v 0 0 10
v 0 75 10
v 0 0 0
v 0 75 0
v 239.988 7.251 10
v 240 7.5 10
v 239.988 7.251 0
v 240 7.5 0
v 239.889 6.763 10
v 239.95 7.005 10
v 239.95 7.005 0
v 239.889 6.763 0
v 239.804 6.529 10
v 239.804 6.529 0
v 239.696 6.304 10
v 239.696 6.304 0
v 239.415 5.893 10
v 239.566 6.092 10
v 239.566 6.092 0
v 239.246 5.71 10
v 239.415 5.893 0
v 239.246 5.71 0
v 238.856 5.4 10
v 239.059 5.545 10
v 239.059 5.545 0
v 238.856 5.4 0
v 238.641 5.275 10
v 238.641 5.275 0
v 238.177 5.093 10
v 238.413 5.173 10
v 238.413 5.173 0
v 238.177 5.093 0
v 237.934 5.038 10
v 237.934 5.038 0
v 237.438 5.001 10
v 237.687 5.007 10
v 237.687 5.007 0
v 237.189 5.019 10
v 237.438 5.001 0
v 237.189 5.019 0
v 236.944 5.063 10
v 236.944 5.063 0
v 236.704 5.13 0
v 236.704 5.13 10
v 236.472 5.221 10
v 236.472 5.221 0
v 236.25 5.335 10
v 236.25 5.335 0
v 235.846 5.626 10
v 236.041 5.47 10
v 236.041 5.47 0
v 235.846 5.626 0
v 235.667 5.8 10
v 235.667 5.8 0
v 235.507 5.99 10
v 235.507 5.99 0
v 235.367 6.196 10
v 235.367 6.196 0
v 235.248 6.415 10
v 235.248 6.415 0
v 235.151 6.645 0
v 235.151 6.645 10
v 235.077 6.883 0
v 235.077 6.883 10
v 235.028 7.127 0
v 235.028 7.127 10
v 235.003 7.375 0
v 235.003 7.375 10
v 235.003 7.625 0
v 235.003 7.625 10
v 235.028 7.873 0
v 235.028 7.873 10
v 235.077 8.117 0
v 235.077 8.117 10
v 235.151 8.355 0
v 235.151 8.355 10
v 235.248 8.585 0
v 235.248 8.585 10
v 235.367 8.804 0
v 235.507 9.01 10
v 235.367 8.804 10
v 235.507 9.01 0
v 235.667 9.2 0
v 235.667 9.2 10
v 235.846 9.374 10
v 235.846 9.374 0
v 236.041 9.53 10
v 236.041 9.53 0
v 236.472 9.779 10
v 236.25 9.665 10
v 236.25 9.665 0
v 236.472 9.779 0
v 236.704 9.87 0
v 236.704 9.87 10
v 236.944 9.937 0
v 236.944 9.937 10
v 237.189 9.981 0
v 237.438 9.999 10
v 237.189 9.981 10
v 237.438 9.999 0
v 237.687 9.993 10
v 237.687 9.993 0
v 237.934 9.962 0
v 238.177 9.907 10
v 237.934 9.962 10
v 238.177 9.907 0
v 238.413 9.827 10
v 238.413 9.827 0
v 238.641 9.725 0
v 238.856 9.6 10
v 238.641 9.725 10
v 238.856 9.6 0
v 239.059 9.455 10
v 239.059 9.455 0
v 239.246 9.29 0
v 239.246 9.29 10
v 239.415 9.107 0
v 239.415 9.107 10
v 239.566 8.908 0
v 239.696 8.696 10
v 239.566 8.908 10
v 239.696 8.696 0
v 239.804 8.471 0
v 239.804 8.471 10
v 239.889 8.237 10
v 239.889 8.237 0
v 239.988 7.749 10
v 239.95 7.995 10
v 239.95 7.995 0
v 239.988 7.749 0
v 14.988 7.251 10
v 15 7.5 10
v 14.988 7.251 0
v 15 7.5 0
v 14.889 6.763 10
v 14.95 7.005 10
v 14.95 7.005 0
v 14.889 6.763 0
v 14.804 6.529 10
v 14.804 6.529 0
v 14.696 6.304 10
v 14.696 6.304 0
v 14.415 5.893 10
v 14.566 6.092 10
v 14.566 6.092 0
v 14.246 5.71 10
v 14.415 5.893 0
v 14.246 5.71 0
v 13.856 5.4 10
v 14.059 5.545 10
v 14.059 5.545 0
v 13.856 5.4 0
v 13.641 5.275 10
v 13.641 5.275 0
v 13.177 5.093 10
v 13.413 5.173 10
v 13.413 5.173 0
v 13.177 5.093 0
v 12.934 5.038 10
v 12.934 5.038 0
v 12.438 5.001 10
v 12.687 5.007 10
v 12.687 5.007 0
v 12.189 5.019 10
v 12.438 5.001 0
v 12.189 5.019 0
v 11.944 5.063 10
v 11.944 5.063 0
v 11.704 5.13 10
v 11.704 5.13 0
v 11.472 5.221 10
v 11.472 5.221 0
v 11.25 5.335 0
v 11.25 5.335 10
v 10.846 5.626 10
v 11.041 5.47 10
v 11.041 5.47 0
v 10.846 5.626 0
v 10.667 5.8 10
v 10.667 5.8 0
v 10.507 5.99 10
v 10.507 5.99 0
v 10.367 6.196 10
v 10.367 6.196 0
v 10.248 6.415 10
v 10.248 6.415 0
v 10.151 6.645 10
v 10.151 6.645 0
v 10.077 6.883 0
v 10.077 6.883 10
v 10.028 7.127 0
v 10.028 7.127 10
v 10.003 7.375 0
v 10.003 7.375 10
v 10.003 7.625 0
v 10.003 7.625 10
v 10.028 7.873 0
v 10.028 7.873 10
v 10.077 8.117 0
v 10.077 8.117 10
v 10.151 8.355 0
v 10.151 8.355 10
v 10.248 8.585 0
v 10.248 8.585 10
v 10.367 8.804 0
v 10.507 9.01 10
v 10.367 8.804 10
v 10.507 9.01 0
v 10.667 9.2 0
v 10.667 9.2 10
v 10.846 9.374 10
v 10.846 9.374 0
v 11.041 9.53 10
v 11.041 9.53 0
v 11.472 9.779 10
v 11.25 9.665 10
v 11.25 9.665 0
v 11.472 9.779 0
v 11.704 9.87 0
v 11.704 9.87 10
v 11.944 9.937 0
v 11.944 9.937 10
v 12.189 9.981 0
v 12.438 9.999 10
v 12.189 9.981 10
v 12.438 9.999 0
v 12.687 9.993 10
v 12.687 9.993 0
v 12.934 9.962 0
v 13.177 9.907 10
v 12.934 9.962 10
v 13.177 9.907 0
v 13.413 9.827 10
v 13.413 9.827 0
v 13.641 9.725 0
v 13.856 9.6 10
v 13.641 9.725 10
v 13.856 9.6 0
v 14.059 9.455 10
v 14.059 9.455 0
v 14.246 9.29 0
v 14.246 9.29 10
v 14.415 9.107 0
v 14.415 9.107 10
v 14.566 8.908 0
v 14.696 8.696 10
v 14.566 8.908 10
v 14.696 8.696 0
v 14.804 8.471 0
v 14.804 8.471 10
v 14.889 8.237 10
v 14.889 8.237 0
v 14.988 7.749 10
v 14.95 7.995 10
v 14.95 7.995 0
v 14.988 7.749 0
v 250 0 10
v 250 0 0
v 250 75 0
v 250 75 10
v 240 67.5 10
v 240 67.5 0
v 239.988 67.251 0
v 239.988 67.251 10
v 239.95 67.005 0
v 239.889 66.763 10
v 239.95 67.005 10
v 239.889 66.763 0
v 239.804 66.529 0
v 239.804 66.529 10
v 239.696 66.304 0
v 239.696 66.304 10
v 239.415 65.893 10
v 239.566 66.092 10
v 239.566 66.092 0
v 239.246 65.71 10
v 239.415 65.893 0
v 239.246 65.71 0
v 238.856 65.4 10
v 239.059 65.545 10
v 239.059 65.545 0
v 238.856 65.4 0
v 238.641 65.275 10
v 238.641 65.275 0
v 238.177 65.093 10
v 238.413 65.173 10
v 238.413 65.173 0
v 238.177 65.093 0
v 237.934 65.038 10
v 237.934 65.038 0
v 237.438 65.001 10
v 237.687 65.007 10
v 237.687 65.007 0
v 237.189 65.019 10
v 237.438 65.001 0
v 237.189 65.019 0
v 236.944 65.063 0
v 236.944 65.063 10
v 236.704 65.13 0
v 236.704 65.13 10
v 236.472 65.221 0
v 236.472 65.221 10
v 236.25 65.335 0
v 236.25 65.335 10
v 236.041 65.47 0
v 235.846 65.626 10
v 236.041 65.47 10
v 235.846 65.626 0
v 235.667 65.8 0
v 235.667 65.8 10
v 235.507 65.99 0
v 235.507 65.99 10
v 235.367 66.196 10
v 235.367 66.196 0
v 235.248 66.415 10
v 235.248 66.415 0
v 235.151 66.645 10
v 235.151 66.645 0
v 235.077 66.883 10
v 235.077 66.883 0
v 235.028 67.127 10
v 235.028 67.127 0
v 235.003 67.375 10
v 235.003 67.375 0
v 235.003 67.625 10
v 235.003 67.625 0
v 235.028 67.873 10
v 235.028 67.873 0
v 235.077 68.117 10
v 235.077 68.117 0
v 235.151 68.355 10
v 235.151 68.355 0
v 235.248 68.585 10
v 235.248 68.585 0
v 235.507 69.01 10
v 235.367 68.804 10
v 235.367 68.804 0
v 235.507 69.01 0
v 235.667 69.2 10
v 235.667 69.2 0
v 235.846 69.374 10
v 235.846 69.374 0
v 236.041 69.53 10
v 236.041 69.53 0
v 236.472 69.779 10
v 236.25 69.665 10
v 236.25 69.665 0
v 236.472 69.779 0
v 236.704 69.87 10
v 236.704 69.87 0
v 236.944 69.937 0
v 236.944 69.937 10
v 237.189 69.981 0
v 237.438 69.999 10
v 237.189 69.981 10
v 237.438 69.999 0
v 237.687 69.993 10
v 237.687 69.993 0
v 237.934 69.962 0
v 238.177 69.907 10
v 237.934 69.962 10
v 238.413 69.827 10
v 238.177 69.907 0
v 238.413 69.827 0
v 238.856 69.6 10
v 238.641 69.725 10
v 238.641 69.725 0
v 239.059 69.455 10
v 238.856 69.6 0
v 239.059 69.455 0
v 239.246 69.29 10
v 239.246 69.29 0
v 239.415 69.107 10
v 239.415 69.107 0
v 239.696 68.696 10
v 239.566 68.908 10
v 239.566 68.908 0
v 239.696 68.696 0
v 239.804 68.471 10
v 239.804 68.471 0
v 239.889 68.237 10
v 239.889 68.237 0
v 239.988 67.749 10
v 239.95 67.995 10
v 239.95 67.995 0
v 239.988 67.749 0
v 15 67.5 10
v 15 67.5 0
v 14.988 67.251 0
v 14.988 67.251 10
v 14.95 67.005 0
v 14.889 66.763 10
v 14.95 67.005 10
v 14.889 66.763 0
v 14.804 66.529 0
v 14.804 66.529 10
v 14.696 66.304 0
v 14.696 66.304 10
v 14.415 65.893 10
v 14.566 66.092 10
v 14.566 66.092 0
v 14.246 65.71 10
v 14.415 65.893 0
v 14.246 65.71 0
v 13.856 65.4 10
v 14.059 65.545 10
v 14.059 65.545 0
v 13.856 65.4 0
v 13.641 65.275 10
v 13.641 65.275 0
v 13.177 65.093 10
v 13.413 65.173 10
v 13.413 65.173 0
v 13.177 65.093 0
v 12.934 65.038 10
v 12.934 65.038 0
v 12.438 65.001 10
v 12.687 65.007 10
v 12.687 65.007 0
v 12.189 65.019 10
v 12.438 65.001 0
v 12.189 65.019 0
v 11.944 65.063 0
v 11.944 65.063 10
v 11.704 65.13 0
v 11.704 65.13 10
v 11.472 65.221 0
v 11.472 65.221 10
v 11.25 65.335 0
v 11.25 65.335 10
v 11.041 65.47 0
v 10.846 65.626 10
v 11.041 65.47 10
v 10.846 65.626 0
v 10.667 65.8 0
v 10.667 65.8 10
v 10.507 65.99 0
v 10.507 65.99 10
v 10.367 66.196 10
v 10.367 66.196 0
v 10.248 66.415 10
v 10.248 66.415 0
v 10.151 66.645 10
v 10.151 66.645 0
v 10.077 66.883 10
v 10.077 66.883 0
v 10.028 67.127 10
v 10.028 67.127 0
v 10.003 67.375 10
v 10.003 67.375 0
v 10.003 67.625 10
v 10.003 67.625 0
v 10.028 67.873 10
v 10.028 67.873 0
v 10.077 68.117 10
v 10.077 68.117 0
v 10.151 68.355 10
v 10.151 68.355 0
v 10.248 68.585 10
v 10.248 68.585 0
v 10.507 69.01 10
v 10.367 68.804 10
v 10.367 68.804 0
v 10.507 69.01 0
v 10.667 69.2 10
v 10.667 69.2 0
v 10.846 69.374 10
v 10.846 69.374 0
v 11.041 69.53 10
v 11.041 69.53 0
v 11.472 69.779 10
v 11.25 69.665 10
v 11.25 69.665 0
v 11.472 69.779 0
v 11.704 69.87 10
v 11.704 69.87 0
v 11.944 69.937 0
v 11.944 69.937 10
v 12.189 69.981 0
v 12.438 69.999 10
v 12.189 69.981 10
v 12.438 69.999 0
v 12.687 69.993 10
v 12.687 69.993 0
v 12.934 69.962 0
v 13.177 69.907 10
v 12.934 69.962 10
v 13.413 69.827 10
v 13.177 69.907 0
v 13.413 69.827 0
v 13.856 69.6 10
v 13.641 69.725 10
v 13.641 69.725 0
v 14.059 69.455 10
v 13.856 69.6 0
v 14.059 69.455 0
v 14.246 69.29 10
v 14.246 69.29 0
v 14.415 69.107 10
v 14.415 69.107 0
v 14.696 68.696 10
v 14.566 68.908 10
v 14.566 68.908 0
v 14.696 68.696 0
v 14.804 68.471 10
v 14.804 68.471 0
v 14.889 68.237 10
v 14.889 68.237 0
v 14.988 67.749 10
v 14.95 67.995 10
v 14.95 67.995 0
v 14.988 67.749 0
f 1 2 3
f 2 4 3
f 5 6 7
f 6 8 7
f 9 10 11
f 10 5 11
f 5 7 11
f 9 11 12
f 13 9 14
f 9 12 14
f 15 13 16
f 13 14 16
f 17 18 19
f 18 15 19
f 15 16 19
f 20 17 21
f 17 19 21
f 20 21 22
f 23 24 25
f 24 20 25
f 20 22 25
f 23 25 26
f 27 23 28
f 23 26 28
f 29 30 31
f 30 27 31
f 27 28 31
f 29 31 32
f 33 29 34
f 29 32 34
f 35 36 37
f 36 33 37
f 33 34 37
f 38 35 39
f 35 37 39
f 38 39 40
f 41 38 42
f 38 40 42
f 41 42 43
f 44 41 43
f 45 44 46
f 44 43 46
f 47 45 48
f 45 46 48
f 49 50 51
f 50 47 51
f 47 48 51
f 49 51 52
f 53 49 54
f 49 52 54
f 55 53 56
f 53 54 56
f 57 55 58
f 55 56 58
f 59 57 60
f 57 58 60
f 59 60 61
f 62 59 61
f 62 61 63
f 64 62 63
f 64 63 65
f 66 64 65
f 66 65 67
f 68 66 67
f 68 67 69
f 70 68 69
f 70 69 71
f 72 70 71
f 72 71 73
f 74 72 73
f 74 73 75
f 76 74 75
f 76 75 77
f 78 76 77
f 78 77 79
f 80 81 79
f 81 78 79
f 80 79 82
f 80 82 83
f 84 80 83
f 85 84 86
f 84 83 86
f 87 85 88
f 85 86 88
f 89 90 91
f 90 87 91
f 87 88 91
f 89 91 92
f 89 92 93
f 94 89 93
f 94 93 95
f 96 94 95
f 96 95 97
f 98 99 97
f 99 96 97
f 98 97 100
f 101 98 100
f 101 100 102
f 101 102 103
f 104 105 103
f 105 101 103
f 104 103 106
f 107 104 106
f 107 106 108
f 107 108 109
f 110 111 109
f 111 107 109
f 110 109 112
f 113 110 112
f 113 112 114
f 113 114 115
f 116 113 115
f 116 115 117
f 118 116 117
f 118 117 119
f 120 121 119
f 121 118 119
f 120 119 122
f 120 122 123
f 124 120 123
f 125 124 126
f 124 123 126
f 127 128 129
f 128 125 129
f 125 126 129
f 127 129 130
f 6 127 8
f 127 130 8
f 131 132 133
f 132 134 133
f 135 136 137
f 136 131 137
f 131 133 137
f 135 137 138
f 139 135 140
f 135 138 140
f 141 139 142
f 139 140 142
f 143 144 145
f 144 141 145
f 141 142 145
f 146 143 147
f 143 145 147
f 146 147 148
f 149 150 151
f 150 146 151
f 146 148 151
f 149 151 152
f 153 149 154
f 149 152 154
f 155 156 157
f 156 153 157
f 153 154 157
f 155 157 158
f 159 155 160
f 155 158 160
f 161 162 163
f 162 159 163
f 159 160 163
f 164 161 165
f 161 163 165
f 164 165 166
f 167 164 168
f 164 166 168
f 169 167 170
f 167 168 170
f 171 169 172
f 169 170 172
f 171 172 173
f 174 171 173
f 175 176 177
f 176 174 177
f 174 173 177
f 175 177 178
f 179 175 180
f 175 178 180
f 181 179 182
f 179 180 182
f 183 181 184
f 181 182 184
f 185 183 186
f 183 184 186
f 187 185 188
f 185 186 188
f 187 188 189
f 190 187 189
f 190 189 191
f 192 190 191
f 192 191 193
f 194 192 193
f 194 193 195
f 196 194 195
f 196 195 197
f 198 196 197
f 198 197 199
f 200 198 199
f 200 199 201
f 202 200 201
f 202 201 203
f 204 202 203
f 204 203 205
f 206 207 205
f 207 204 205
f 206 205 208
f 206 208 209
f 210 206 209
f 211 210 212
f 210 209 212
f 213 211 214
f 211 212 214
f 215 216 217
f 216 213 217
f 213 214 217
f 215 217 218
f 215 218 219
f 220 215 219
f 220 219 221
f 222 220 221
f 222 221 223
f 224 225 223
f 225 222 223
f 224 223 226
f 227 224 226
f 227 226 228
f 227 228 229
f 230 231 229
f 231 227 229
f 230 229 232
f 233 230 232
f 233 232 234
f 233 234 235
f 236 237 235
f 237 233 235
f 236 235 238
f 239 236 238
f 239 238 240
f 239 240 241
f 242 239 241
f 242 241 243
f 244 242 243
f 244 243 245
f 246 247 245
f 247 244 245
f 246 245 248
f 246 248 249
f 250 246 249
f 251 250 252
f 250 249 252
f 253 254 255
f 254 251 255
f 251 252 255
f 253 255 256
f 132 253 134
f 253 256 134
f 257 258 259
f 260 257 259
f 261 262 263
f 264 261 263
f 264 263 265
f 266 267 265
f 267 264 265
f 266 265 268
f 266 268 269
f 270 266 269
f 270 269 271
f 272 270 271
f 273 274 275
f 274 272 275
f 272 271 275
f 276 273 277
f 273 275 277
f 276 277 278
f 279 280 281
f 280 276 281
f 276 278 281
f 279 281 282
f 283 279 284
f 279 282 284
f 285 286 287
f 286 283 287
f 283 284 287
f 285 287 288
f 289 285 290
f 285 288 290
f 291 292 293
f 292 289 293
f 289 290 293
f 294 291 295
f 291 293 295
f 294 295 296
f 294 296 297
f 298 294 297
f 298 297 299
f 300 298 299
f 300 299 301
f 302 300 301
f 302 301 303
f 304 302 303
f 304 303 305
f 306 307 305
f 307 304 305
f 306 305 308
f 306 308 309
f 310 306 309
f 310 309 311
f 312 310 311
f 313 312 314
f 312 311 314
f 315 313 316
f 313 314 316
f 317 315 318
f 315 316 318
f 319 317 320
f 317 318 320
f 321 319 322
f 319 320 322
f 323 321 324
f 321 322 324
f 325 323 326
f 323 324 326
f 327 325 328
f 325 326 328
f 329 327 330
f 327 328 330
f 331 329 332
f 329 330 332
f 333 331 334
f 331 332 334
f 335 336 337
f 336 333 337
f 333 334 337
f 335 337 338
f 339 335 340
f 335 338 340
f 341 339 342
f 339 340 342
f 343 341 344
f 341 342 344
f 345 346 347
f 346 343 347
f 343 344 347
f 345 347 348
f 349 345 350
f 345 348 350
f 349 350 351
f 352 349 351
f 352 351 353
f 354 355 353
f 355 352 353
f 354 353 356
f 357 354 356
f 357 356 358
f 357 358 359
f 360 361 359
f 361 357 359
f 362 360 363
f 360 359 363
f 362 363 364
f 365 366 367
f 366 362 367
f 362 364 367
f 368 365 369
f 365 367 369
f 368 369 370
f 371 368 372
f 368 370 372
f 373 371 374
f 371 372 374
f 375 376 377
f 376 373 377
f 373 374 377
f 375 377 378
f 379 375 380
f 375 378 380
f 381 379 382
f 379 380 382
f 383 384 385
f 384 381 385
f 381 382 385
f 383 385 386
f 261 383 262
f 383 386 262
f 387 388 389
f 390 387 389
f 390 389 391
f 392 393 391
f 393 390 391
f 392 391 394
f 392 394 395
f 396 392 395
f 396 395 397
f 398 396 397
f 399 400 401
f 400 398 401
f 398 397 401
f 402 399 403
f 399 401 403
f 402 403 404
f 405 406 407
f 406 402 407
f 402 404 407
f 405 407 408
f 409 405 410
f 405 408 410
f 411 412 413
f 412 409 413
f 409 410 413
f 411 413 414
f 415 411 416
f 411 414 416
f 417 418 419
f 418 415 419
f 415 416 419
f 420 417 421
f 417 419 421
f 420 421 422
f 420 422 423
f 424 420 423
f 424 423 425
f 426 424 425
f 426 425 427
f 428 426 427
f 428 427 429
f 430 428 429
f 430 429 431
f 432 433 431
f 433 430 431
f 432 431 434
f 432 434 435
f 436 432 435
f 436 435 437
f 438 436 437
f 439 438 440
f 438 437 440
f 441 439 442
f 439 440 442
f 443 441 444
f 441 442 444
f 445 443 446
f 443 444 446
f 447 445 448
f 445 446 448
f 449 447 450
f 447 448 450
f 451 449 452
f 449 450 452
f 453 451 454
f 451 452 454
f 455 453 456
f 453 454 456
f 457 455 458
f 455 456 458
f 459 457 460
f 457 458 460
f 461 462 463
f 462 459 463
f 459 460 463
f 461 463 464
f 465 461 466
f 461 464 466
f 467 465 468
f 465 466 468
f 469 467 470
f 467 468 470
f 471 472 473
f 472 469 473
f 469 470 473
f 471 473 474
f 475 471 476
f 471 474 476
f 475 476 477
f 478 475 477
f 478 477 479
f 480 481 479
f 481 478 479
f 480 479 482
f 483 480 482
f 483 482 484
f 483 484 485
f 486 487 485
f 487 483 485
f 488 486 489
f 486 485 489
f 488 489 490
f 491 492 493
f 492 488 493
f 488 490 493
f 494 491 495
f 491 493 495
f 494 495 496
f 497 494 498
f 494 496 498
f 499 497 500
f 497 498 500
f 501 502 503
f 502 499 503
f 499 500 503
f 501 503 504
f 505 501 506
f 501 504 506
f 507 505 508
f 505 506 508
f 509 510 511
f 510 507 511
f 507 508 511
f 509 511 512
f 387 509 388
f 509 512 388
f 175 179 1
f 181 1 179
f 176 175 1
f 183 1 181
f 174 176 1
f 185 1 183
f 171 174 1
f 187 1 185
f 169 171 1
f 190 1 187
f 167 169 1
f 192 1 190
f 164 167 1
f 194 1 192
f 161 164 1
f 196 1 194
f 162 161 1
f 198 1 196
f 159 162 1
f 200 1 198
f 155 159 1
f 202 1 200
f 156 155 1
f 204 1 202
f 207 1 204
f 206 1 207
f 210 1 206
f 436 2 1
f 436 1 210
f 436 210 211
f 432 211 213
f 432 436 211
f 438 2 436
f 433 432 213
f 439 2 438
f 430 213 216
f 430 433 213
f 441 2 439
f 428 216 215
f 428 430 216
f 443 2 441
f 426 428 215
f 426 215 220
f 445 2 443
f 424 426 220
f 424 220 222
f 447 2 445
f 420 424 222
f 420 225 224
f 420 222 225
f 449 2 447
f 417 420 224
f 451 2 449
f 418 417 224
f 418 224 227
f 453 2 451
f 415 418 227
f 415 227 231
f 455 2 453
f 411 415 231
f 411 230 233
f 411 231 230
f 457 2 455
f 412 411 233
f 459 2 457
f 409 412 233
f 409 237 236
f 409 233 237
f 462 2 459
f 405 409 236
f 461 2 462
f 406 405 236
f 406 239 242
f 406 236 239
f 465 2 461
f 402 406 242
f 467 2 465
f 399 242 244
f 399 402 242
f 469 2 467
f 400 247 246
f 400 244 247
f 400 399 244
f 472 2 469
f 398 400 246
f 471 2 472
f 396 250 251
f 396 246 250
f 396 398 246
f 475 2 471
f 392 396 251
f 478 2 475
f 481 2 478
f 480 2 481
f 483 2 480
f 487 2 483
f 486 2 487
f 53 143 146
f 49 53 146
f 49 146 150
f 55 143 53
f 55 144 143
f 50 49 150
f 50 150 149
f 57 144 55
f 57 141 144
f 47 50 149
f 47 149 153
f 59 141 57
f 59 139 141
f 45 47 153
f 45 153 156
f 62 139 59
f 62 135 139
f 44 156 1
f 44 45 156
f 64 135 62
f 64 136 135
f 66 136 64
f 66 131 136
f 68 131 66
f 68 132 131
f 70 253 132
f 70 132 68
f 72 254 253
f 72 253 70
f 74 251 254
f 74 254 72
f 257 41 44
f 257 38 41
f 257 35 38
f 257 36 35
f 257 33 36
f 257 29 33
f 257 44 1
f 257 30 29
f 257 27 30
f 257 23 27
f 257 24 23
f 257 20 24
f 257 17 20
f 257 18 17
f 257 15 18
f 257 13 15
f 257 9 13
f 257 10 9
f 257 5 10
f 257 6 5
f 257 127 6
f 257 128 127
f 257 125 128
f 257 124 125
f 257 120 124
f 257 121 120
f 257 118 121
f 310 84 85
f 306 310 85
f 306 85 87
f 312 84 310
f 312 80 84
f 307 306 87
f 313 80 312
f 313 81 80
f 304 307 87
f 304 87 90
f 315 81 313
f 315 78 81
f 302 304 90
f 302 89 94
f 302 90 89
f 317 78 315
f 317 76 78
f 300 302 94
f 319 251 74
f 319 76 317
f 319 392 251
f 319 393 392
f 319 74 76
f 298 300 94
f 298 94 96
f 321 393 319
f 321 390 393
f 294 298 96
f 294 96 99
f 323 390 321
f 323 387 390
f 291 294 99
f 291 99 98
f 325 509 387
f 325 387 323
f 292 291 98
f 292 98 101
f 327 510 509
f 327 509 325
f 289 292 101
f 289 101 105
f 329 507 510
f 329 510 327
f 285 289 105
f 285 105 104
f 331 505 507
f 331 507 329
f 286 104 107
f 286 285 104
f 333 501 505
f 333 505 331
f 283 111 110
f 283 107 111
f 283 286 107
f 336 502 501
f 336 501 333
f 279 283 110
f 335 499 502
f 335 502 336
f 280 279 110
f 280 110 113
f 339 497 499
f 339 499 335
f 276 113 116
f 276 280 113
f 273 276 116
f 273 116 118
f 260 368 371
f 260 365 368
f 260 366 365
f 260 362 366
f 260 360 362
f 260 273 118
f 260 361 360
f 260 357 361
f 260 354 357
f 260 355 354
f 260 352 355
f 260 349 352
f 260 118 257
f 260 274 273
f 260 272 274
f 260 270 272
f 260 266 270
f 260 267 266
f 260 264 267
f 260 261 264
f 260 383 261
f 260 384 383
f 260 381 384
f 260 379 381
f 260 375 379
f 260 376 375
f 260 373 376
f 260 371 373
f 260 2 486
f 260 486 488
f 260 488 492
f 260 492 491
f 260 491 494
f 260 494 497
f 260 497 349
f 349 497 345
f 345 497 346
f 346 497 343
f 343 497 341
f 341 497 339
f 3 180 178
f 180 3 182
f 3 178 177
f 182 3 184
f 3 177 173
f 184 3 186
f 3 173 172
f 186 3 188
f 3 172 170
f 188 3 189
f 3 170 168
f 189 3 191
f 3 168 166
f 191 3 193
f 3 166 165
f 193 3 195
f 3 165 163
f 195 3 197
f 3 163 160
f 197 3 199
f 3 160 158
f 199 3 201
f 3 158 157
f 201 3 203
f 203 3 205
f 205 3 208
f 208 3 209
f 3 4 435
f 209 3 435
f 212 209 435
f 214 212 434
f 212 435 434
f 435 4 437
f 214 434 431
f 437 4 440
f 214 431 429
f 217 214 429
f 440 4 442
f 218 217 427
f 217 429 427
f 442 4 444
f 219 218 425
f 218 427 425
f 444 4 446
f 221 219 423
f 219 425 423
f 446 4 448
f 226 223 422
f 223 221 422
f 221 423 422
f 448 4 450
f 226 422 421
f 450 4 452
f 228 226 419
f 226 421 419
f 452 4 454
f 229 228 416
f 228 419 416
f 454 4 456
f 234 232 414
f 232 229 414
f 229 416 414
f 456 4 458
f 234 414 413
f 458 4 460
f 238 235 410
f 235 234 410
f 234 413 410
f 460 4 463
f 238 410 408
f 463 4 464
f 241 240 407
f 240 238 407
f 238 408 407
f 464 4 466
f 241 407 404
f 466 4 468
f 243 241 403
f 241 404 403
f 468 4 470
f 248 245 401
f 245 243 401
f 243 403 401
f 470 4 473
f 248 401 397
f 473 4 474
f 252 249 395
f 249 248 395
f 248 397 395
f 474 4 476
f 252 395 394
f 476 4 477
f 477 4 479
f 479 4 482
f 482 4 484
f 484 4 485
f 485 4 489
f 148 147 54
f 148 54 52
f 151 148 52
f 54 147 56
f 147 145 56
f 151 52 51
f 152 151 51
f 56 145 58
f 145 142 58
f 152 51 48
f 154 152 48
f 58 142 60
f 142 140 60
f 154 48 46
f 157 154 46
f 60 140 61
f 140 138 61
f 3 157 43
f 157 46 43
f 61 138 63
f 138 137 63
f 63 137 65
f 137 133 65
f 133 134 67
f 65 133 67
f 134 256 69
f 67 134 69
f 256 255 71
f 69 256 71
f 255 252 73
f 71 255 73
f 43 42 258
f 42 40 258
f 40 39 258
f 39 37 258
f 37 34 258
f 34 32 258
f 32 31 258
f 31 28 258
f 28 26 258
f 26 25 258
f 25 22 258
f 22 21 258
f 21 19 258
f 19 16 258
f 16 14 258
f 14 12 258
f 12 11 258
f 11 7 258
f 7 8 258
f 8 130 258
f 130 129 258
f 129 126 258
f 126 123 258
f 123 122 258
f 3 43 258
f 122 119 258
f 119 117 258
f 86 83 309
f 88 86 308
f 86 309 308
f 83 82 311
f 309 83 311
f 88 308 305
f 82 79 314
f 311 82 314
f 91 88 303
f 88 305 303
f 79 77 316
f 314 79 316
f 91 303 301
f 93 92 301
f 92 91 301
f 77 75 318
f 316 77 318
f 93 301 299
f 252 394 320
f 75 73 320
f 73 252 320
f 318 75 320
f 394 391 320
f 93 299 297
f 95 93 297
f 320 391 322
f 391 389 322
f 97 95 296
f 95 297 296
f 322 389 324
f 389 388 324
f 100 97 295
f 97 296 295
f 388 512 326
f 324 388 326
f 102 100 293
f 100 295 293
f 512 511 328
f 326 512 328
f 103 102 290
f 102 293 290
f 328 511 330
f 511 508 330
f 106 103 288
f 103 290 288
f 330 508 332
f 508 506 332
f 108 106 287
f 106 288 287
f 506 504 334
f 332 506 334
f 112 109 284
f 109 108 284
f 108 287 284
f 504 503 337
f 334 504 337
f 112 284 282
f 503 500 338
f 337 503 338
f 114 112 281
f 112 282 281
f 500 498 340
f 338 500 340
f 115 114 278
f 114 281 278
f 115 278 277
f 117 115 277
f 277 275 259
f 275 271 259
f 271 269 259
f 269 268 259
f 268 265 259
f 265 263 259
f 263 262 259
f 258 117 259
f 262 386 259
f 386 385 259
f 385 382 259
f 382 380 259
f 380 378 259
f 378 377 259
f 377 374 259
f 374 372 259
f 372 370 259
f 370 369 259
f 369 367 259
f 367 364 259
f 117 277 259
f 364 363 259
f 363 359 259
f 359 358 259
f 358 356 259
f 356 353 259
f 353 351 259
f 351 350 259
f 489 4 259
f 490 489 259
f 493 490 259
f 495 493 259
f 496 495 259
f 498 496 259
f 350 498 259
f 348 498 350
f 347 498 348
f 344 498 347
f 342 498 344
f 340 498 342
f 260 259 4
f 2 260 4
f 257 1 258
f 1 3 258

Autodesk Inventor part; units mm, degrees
ref_plane "YZ Plane" through (0, 0, 0) normal (1, 0, 0) x (0, 1, 0)
ref_plane "XZ Plane" through (0, 0, 0) normal (0, 1, 0) x (-1, 0, 0)
ref_plane "XY Plane" through (0, 0, 0) normal (0, 0, 1) x (1, 0, 0)
sketch "Sketch1" plane through (0, 0, 0) normal (0, 0, 1) x (1, 0, 0)
  line L0 (0, 0) -> (250, 0)
  line L1 (250, 0) -> (250, 75)
  line L2 (250, 75) -> (0, 75)
  line L3 (0, 75) -> (0, 0)
  line L4 (12.5, 67.5) -> (237.5, 67.5) construction
  line L5 (237.5, 67.5) -> (237.5, 7.5) construction
  line L6 (237.5, 7.5) -> (12.5, 7.5) construction
  line L7 (12.5, 7.5) -> (12.5, 67.5) construction
  circle A0 centre (12.5, 67.5) radius 2.5
  circle A1 centre (12.5, 7.5) radius 2.5
  circle A2 centre (237.5, 7.5) radius 2.5
  circle A3 centre (237.5, 67.5) radius 2.5
  circle A4 centre (125, 37.5) radius 12.5
  point P0 (125, 67.5)
  point P1 (125, 75)
  point P2 (12.5, 37.5)
  point P3 (0, 37.5)
  dimension "d0" = 250
  dimension "d1" = 75
  dimension "d2" = 225
  dimension "d3" = 60
  dimension "d4" = 5
  dimension "d5" = 5
  dimension "d6" = 5
  dimension "d7" = 5
  dimension "d8" = 25
extrude "Extrusion1" add sketch "Sketch1" along normal blind 10 contours L3 L2 L1 L0 | A4
properties part number "HA03" material "ABS Plastic"
